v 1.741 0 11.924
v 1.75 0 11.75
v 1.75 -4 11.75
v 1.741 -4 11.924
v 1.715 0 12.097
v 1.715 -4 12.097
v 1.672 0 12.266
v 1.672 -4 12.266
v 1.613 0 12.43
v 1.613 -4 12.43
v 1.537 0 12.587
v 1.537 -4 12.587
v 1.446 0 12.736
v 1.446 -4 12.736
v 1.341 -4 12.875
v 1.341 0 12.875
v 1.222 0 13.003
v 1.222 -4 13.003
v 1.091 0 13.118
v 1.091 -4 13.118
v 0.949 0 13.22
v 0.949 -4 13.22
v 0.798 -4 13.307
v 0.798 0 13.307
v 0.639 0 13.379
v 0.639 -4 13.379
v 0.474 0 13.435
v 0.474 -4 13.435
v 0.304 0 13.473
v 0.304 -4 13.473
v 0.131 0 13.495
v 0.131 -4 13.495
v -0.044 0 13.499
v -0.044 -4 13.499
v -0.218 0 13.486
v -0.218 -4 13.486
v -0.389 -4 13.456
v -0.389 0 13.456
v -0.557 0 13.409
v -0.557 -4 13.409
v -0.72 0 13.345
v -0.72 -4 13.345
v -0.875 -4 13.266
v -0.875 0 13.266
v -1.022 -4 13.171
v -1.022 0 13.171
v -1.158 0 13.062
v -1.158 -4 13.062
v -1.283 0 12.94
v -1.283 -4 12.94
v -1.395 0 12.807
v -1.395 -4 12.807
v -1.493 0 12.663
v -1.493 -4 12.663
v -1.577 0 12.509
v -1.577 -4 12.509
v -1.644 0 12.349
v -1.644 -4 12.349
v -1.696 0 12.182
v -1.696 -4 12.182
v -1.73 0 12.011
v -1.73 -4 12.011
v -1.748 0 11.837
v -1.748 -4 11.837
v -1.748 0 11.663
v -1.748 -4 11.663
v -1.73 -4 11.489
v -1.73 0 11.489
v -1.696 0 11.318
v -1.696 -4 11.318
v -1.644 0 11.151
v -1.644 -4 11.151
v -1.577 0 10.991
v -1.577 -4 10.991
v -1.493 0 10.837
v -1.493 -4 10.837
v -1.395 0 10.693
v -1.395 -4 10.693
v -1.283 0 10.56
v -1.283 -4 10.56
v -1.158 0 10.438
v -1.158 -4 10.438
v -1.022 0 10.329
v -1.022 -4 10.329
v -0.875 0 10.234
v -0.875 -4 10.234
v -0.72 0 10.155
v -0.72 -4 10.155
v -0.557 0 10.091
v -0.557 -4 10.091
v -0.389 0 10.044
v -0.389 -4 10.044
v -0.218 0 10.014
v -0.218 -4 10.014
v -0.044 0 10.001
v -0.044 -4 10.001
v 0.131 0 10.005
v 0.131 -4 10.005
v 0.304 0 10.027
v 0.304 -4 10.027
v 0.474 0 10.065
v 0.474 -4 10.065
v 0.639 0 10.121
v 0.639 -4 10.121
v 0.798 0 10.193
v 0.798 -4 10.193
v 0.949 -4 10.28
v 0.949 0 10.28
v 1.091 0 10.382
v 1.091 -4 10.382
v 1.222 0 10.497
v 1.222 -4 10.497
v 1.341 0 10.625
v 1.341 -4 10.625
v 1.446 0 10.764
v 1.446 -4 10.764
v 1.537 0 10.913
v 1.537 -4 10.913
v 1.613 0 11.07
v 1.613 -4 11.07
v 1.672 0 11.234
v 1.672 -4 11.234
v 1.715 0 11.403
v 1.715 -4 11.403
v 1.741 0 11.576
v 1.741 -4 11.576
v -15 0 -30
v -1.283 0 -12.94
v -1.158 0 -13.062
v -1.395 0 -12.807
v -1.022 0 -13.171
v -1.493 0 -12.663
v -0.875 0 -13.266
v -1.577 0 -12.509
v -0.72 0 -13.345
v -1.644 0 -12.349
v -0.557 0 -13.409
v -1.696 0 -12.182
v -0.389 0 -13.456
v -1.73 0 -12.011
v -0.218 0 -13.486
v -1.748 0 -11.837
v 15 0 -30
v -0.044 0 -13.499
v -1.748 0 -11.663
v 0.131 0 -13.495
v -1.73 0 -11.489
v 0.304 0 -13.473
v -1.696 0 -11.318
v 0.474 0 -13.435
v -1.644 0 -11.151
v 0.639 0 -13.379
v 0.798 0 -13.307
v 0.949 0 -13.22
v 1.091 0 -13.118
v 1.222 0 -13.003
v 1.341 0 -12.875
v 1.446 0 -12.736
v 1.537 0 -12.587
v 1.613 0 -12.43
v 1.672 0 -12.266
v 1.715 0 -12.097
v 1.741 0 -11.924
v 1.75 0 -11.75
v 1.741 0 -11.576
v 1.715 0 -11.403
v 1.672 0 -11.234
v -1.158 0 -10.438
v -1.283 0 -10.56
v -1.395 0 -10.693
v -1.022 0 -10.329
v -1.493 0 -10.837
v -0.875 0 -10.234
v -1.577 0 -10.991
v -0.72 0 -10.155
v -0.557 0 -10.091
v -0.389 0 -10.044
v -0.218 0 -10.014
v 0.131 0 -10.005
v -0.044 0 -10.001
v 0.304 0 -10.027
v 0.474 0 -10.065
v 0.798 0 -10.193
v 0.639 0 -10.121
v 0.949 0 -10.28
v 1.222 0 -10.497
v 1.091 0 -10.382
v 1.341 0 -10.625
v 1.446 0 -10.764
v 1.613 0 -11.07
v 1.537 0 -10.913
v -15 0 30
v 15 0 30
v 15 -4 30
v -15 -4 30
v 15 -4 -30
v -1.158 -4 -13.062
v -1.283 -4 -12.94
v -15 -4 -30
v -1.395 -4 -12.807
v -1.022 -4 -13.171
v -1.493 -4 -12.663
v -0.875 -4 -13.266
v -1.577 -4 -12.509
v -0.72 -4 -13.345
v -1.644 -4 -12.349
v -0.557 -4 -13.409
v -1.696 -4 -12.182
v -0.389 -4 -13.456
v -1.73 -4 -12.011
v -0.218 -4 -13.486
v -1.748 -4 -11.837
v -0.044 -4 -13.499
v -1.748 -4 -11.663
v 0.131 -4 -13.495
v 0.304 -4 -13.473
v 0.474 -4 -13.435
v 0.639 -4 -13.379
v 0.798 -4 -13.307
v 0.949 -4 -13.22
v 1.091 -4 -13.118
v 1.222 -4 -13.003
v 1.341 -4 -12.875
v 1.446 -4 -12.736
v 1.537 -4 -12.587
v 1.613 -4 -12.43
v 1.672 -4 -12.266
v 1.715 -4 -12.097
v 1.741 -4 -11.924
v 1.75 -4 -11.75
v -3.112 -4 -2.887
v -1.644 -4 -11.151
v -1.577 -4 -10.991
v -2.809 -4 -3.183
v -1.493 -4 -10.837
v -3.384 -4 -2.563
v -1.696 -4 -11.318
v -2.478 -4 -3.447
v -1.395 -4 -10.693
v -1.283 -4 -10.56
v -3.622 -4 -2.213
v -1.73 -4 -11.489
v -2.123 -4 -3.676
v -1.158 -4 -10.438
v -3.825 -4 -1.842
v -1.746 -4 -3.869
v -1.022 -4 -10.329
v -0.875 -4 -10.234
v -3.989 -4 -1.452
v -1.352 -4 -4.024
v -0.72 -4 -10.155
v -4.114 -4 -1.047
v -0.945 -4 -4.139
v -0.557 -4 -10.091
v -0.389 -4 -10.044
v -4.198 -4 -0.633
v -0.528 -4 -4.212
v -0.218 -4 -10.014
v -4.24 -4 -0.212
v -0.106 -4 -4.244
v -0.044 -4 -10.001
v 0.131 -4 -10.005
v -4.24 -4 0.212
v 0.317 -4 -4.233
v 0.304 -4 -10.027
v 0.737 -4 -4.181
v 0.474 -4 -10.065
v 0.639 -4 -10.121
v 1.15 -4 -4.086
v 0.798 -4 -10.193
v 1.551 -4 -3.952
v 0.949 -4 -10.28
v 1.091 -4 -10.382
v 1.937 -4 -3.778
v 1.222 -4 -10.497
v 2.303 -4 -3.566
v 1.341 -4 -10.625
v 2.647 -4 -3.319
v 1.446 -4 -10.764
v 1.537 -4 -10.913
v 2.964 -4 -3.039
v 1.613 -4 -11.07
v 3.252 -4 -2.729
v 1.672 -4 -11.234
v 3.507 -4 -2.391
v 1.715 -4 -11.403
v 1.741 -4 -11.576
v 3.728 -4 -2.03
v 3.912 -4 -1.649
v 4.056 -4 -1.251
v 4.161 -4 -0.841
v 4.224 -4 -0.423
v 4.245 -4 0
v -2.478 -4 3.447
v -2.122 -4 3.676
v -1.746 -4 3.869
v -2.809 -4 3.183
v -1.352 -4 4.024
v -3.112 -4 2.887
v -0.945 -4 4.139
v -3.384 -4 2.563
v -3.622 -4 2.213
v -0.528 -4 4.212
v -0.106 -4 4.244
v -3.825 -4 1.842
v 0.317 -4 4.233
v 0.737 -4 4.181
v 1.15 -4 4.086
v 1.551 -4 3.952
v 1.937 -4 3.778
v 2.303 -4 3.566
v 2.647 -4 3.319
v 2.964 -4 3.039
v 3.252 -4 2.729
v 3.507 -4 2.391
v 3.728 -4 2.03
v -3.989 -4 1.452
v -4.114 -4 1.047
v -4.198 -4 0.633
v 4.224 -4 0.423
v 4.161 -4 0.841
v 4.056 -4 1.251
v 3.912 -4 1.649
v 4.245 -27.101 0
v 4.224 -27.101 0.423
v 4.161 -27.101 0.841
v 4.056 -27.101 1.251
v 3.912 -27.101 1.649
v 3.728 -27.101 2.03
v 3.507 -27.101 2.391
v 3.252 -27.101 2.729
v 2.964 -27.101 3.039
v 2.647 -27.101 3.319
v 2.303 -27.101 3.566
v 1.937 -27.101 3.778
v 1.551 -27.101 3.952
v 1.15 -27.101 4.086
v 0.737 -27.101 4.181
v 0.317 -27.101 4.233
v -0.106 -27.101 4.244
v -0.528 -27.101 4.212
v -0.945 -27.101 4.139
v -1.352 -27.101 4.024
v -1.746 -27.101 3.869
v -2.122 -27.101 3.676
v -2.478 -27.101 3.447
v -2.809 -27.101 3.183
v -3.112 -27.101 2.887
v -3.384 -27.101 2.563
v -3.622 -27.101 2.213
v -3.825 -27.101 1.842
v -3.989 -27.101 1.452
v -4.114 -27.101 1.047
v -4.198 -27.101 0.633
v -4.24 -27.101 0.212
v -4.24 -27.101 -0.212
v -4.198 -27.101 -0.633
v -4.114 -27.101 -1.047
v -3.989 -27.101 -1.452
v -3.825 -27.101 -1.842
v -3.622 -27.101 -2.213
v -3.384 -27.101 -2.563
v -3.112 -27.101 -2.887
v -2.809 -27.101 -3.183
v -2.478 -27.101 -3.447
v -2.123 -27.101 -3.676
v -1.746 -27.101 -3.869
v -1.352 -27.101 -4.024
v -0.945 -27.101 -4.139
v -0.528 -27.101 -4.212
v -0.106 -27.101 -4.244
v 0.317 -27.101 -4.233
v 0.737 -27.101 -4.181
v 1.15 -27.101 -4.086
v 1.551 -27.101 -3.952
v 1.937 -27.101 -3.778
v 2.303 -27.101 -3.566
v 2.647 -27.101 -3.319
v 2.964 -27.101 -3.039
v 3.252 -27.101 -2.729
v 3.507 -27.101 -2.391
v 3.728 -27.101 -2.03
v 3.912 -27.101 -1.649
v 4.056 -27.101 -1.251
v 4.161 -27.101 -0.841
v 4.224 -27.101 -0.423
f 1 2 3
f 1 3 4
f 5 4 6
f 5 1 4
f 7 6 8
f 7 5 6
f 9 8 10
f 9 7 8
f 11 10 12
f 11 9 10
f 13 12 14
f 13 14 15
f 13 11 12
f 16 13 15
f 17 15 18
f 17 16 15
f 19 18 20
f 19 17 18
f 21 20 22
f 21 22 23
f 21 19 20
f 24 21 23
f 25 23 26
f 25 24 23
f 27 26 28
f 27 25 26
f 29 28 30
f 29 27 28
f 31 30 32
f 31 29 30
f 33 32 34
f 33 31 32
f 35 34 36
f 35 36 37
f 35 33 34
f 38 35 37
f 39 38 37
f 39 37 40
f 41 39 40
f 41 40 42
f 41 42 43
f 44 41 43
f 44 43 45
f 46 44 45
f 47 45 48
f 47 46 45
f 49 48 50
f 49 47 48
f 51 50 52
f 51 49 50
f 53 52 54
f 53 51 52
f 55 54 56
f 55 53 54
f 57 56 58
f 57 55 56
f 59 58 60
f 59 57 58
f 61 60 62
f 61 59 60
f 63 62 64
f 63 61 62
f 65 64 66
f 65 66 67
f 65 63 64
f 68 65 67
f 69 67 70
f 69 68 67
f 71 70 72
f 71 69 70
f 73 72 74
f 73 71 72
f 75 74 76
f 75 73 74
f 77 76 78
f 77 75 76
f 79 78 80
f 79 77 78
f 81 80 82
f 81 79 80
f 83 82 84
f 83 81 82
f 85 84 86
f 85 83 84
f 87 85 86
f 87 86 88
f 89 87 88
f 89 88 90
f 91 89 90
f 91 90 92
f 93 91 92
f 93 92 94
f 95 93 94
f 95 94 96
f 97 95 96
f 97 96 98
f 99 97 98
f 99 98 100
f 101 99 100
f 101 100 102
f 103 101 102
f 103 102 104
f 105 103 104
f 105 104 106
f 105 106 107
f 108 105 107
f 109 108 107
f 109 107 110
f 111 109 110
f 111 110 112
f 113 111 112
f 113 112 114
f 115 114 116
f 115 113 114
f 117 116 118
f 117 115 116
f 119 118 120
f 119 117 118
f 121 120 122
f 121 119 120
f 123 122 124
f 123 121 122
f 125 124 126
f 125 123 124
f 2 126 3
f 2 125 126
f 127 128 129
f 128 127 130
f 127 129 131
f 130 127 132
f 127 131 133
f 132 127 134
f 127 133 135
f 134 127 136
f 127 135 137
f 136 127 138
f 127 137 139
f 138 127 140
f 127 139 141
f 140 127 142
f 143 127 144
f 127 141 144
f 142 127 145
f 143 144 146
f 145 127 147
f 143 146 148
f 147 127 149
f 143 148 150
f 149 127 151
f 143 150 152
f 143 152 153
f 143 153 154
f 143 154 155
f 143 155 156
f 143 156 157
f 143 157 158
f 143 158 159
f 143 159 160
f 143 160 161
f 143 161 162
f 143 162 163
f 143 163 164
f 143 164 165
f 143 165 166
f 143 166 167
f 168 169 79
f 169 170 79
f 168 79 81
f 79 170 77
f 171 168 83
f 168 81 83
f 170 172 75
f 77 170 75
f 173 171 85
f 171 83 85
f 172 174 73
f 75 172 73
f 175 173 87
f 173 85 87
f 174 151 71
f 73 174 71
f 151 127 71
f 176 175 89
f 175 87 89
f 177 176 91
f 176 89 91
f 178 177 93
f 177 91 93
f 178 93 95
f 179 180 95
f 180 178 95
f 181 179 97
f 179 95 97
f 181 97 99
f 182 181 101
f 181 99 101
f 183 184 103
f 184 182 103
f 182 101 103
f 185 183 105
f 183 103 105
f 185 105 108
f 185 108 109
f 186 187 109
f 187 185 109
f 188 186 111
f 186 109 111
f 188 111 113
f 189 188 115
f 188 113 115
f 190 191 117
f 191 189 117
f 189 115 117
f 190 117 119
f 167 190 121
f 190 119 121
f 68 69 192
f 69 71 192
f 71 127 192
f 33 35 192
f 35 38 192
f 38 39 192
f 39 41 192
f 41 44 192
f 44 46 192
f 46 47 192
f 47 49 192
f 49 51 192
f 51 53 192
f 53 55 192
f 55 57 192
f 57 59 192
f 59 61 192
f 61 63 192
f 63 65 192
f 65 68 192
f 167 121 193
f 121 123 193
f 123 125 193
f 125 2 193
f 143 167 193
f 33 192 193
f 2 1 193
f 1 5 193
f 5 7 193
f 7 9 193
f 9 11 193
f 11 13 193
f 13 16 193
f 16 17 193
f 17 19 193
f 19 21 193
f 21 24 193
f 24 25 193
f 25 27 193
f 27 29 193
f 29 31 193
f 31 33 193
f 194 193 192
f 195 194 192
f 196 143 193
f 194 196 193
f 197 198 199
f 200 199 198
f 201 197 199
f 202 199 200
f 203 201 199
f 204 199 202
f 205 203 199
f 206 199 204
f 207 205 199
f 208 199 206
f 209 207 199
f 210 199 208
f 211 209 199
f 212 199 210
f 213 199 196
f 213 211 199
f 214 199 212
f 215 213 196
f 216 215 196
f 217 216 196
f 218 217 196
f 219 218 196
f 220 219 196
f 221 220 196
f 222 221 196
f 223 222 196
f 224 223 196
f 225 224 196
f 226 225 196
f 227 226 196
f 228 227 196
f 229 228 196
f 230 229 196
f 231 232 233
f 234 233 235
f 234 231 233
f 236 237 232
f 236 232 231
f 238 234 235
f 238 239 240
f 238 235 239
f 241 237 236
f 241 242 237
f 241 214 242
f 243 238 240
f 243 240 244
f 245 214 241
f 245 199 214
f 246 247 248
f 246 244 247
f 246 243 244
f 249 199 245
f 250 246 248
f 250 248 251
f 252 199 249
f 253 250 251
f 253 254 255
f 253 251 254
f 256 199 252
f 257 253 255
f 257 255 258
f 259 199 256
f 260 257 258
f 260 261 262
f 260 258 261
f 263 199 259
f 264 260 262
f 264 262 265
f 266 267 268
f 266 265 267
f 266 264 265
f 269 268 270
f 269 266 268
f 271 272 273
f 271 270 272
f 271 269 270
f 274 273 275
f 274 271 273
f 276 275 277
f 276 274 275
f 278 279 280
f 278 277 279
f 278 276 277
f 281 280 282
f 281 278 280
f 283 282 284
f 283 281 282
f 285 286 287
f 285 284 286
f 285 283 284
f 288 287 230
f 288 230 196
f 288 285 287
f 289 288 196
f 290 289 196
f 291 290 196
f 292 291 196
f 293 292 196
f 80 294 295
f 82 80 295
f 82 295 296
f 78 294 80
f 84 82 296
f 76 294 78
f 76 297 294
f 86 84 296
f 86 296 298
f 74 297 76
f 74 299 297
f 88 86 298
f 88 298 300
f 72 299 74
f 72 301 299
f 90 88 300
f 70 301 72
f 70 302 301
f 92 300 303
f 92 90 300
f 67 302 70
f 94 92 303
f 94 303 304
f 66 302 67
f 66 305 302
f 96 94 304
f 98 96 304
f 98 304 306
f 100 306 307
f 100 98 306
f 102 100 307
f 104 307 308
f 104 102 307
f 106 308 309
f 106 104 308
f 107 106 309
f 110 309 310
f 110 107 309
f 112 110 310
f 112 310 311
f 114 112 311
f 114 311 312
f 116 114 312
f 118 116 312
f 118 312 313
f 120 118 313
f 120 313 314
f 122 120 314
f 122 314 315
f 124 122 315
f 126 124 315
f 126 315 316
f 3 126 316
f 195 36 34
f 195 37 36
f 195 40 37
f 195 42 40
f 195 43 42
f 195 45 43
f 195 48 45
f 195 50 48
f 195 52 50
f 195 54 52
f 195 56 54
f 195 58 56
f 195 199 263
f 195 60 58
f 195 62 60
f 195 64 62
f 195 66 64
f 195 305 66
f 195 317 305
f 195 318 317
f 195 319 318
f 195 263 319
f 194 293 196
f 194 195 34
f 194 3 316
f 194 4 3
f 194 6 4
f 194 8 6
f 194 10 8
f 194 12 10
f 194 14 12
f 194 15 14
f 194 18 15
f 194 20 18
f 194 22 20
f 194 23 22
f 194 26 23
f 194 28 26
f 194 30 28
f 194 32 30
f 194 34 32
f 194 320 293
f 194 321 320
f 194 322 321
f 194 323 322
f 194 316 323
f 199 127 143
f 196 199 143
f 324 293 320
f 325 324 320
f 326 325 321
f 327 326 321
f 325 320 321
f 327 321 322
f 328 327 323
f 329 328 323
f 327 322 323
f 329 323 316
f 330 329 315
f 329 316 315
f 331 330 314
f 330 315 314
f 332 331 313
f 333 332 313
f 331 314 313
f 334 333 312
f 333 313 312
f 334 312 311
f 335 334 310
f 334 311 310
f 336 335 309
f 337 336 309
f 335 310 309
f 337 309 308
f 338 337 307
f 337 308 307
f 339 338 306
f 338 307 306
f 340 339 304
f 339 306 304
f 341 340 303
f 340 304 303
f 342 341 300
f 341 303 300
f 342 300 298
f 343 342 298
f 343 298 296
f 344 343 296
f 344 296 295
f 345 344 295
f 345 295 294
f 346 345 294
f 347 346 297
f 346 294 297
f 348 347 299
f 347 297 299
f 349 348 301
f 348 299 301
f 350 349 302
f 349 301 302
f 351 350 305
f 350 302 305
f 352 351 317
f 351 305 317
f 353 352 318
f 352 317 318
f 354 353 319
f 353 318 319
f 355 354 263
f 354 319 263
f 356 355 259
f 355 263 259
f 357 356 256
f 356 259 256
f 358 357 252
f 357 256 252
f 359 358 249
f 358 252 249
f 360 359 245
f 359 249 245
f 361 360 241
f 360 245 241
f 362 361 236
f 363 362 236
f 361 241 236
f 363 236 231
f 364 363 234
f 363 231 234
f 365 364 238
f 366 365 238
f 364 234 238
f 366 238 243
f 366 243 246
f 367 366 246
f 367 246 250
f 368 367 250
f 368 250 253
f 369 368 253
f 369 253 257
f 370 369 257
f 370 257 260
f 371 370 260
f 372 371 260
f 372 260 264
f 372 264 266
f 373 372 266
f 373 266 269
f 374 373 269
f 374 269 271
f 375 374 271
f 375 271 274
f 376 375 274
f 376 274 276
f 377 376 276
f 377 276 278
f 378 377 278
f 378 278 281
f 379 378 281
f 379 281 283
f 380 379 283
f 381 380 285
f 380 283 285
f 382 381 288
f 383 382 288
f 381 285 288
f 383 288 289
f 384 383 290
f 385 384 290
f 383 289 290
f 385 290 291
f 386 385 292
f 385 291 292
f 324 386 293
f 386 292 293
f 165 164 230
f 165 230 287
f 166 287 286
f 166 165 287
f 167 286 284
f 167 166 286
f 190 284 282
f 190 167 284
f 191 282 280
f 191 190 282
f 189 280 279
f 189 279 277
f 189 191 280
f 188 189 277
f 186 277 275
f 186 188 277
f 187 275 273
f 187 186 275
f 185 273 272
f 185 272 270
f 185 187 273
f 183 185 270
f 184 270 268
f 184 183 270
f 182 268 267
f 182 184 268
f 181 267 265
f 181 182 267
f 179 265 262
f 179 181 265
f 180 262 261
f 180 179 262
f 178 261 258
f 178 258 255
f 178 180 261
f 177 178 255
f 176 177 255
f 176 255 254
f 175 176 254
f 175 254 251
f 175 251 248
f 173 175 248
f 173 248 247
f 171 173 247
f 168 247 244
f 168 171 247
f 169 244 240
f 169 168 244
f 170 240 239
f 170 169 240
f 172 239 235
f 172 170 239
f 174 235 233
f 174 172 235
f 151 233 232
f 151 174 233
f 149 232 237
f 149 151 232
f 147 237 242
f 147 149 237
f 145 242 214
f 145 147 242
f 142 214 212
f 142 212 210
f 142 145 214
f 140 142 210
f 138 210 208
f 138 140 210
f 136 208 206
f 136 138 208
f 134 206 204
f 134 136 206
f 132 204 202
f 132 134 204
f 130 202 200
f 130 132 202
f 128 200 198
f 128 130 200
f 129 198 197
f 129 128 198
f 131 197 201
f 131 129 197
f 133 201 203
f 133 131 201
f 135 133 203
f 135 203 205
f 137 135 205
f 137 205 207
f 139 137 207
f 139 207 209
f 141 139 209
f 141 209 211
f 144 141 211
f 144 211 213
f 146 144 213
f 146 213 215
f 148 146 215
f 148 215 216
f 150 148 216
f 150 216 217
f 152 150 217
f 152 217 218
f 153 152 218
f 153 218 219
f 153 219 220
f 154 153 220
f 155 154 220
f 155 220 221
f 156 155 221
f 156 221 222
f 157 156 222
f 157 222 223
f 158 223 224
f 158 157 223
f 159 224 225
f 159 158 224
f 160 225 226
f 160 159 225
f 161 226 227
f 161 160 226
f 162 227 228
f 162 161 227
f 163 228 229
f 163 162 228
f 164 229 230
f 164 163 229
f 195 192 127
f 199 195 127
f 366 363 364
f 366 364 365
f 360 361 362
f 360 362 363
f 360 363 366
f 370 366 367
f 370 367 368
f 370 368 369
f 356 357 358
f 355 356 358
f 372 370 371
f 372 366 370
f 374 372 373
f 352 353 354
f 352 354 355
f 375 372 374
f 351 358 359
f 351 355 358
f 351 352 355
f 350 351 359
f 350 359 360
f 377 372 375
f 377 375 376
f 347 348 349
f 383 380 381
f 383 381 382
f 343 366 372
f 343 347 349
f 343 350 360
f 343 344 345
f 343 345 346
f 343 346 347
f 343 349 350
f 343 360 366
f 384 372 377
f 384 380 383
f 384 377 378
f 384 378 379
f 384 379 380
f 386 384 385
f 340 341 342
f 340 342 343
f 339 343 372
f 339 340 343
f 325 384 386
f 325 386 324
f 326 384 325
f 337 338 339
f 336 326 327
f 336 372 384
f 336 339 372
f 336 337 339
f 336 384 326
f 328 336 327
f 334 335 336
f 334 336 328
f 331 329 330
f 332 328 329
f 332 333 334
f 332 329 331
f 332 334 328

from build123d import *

# Parameters (mm, degrees)
F0_R     = 1.75
F1_DEPTH = 4
F3_R     = 4.245
F4_DEPTH = 23.101011


with BuildPart() as f1:
    # F0 (on Front) → F1 (new body)
    with BuildSketch(Plane.XZ):
        Polygon((-15, 30), (-15, 0), (-15, -30), (0, -30), (15, -30), (15, 0), (15, 30), (0, 30), align=None)
        with Locations((0, -11.75)):
            Circle(F0_R, mode=Mode.SUBTRACT)
        with Locations((0, 11.75)):
            Circle(F0_R, mode=Mode.SUBTRACT)
    extrude(amount=F1_DEPTH)

    # F3 (on face) → F4 (join)
    with BuildSketch(Plane.XZ.offset(4)):
        Circle(F3_R)
    extrude(amount=F4_DEPTH)


solid = f1.part
